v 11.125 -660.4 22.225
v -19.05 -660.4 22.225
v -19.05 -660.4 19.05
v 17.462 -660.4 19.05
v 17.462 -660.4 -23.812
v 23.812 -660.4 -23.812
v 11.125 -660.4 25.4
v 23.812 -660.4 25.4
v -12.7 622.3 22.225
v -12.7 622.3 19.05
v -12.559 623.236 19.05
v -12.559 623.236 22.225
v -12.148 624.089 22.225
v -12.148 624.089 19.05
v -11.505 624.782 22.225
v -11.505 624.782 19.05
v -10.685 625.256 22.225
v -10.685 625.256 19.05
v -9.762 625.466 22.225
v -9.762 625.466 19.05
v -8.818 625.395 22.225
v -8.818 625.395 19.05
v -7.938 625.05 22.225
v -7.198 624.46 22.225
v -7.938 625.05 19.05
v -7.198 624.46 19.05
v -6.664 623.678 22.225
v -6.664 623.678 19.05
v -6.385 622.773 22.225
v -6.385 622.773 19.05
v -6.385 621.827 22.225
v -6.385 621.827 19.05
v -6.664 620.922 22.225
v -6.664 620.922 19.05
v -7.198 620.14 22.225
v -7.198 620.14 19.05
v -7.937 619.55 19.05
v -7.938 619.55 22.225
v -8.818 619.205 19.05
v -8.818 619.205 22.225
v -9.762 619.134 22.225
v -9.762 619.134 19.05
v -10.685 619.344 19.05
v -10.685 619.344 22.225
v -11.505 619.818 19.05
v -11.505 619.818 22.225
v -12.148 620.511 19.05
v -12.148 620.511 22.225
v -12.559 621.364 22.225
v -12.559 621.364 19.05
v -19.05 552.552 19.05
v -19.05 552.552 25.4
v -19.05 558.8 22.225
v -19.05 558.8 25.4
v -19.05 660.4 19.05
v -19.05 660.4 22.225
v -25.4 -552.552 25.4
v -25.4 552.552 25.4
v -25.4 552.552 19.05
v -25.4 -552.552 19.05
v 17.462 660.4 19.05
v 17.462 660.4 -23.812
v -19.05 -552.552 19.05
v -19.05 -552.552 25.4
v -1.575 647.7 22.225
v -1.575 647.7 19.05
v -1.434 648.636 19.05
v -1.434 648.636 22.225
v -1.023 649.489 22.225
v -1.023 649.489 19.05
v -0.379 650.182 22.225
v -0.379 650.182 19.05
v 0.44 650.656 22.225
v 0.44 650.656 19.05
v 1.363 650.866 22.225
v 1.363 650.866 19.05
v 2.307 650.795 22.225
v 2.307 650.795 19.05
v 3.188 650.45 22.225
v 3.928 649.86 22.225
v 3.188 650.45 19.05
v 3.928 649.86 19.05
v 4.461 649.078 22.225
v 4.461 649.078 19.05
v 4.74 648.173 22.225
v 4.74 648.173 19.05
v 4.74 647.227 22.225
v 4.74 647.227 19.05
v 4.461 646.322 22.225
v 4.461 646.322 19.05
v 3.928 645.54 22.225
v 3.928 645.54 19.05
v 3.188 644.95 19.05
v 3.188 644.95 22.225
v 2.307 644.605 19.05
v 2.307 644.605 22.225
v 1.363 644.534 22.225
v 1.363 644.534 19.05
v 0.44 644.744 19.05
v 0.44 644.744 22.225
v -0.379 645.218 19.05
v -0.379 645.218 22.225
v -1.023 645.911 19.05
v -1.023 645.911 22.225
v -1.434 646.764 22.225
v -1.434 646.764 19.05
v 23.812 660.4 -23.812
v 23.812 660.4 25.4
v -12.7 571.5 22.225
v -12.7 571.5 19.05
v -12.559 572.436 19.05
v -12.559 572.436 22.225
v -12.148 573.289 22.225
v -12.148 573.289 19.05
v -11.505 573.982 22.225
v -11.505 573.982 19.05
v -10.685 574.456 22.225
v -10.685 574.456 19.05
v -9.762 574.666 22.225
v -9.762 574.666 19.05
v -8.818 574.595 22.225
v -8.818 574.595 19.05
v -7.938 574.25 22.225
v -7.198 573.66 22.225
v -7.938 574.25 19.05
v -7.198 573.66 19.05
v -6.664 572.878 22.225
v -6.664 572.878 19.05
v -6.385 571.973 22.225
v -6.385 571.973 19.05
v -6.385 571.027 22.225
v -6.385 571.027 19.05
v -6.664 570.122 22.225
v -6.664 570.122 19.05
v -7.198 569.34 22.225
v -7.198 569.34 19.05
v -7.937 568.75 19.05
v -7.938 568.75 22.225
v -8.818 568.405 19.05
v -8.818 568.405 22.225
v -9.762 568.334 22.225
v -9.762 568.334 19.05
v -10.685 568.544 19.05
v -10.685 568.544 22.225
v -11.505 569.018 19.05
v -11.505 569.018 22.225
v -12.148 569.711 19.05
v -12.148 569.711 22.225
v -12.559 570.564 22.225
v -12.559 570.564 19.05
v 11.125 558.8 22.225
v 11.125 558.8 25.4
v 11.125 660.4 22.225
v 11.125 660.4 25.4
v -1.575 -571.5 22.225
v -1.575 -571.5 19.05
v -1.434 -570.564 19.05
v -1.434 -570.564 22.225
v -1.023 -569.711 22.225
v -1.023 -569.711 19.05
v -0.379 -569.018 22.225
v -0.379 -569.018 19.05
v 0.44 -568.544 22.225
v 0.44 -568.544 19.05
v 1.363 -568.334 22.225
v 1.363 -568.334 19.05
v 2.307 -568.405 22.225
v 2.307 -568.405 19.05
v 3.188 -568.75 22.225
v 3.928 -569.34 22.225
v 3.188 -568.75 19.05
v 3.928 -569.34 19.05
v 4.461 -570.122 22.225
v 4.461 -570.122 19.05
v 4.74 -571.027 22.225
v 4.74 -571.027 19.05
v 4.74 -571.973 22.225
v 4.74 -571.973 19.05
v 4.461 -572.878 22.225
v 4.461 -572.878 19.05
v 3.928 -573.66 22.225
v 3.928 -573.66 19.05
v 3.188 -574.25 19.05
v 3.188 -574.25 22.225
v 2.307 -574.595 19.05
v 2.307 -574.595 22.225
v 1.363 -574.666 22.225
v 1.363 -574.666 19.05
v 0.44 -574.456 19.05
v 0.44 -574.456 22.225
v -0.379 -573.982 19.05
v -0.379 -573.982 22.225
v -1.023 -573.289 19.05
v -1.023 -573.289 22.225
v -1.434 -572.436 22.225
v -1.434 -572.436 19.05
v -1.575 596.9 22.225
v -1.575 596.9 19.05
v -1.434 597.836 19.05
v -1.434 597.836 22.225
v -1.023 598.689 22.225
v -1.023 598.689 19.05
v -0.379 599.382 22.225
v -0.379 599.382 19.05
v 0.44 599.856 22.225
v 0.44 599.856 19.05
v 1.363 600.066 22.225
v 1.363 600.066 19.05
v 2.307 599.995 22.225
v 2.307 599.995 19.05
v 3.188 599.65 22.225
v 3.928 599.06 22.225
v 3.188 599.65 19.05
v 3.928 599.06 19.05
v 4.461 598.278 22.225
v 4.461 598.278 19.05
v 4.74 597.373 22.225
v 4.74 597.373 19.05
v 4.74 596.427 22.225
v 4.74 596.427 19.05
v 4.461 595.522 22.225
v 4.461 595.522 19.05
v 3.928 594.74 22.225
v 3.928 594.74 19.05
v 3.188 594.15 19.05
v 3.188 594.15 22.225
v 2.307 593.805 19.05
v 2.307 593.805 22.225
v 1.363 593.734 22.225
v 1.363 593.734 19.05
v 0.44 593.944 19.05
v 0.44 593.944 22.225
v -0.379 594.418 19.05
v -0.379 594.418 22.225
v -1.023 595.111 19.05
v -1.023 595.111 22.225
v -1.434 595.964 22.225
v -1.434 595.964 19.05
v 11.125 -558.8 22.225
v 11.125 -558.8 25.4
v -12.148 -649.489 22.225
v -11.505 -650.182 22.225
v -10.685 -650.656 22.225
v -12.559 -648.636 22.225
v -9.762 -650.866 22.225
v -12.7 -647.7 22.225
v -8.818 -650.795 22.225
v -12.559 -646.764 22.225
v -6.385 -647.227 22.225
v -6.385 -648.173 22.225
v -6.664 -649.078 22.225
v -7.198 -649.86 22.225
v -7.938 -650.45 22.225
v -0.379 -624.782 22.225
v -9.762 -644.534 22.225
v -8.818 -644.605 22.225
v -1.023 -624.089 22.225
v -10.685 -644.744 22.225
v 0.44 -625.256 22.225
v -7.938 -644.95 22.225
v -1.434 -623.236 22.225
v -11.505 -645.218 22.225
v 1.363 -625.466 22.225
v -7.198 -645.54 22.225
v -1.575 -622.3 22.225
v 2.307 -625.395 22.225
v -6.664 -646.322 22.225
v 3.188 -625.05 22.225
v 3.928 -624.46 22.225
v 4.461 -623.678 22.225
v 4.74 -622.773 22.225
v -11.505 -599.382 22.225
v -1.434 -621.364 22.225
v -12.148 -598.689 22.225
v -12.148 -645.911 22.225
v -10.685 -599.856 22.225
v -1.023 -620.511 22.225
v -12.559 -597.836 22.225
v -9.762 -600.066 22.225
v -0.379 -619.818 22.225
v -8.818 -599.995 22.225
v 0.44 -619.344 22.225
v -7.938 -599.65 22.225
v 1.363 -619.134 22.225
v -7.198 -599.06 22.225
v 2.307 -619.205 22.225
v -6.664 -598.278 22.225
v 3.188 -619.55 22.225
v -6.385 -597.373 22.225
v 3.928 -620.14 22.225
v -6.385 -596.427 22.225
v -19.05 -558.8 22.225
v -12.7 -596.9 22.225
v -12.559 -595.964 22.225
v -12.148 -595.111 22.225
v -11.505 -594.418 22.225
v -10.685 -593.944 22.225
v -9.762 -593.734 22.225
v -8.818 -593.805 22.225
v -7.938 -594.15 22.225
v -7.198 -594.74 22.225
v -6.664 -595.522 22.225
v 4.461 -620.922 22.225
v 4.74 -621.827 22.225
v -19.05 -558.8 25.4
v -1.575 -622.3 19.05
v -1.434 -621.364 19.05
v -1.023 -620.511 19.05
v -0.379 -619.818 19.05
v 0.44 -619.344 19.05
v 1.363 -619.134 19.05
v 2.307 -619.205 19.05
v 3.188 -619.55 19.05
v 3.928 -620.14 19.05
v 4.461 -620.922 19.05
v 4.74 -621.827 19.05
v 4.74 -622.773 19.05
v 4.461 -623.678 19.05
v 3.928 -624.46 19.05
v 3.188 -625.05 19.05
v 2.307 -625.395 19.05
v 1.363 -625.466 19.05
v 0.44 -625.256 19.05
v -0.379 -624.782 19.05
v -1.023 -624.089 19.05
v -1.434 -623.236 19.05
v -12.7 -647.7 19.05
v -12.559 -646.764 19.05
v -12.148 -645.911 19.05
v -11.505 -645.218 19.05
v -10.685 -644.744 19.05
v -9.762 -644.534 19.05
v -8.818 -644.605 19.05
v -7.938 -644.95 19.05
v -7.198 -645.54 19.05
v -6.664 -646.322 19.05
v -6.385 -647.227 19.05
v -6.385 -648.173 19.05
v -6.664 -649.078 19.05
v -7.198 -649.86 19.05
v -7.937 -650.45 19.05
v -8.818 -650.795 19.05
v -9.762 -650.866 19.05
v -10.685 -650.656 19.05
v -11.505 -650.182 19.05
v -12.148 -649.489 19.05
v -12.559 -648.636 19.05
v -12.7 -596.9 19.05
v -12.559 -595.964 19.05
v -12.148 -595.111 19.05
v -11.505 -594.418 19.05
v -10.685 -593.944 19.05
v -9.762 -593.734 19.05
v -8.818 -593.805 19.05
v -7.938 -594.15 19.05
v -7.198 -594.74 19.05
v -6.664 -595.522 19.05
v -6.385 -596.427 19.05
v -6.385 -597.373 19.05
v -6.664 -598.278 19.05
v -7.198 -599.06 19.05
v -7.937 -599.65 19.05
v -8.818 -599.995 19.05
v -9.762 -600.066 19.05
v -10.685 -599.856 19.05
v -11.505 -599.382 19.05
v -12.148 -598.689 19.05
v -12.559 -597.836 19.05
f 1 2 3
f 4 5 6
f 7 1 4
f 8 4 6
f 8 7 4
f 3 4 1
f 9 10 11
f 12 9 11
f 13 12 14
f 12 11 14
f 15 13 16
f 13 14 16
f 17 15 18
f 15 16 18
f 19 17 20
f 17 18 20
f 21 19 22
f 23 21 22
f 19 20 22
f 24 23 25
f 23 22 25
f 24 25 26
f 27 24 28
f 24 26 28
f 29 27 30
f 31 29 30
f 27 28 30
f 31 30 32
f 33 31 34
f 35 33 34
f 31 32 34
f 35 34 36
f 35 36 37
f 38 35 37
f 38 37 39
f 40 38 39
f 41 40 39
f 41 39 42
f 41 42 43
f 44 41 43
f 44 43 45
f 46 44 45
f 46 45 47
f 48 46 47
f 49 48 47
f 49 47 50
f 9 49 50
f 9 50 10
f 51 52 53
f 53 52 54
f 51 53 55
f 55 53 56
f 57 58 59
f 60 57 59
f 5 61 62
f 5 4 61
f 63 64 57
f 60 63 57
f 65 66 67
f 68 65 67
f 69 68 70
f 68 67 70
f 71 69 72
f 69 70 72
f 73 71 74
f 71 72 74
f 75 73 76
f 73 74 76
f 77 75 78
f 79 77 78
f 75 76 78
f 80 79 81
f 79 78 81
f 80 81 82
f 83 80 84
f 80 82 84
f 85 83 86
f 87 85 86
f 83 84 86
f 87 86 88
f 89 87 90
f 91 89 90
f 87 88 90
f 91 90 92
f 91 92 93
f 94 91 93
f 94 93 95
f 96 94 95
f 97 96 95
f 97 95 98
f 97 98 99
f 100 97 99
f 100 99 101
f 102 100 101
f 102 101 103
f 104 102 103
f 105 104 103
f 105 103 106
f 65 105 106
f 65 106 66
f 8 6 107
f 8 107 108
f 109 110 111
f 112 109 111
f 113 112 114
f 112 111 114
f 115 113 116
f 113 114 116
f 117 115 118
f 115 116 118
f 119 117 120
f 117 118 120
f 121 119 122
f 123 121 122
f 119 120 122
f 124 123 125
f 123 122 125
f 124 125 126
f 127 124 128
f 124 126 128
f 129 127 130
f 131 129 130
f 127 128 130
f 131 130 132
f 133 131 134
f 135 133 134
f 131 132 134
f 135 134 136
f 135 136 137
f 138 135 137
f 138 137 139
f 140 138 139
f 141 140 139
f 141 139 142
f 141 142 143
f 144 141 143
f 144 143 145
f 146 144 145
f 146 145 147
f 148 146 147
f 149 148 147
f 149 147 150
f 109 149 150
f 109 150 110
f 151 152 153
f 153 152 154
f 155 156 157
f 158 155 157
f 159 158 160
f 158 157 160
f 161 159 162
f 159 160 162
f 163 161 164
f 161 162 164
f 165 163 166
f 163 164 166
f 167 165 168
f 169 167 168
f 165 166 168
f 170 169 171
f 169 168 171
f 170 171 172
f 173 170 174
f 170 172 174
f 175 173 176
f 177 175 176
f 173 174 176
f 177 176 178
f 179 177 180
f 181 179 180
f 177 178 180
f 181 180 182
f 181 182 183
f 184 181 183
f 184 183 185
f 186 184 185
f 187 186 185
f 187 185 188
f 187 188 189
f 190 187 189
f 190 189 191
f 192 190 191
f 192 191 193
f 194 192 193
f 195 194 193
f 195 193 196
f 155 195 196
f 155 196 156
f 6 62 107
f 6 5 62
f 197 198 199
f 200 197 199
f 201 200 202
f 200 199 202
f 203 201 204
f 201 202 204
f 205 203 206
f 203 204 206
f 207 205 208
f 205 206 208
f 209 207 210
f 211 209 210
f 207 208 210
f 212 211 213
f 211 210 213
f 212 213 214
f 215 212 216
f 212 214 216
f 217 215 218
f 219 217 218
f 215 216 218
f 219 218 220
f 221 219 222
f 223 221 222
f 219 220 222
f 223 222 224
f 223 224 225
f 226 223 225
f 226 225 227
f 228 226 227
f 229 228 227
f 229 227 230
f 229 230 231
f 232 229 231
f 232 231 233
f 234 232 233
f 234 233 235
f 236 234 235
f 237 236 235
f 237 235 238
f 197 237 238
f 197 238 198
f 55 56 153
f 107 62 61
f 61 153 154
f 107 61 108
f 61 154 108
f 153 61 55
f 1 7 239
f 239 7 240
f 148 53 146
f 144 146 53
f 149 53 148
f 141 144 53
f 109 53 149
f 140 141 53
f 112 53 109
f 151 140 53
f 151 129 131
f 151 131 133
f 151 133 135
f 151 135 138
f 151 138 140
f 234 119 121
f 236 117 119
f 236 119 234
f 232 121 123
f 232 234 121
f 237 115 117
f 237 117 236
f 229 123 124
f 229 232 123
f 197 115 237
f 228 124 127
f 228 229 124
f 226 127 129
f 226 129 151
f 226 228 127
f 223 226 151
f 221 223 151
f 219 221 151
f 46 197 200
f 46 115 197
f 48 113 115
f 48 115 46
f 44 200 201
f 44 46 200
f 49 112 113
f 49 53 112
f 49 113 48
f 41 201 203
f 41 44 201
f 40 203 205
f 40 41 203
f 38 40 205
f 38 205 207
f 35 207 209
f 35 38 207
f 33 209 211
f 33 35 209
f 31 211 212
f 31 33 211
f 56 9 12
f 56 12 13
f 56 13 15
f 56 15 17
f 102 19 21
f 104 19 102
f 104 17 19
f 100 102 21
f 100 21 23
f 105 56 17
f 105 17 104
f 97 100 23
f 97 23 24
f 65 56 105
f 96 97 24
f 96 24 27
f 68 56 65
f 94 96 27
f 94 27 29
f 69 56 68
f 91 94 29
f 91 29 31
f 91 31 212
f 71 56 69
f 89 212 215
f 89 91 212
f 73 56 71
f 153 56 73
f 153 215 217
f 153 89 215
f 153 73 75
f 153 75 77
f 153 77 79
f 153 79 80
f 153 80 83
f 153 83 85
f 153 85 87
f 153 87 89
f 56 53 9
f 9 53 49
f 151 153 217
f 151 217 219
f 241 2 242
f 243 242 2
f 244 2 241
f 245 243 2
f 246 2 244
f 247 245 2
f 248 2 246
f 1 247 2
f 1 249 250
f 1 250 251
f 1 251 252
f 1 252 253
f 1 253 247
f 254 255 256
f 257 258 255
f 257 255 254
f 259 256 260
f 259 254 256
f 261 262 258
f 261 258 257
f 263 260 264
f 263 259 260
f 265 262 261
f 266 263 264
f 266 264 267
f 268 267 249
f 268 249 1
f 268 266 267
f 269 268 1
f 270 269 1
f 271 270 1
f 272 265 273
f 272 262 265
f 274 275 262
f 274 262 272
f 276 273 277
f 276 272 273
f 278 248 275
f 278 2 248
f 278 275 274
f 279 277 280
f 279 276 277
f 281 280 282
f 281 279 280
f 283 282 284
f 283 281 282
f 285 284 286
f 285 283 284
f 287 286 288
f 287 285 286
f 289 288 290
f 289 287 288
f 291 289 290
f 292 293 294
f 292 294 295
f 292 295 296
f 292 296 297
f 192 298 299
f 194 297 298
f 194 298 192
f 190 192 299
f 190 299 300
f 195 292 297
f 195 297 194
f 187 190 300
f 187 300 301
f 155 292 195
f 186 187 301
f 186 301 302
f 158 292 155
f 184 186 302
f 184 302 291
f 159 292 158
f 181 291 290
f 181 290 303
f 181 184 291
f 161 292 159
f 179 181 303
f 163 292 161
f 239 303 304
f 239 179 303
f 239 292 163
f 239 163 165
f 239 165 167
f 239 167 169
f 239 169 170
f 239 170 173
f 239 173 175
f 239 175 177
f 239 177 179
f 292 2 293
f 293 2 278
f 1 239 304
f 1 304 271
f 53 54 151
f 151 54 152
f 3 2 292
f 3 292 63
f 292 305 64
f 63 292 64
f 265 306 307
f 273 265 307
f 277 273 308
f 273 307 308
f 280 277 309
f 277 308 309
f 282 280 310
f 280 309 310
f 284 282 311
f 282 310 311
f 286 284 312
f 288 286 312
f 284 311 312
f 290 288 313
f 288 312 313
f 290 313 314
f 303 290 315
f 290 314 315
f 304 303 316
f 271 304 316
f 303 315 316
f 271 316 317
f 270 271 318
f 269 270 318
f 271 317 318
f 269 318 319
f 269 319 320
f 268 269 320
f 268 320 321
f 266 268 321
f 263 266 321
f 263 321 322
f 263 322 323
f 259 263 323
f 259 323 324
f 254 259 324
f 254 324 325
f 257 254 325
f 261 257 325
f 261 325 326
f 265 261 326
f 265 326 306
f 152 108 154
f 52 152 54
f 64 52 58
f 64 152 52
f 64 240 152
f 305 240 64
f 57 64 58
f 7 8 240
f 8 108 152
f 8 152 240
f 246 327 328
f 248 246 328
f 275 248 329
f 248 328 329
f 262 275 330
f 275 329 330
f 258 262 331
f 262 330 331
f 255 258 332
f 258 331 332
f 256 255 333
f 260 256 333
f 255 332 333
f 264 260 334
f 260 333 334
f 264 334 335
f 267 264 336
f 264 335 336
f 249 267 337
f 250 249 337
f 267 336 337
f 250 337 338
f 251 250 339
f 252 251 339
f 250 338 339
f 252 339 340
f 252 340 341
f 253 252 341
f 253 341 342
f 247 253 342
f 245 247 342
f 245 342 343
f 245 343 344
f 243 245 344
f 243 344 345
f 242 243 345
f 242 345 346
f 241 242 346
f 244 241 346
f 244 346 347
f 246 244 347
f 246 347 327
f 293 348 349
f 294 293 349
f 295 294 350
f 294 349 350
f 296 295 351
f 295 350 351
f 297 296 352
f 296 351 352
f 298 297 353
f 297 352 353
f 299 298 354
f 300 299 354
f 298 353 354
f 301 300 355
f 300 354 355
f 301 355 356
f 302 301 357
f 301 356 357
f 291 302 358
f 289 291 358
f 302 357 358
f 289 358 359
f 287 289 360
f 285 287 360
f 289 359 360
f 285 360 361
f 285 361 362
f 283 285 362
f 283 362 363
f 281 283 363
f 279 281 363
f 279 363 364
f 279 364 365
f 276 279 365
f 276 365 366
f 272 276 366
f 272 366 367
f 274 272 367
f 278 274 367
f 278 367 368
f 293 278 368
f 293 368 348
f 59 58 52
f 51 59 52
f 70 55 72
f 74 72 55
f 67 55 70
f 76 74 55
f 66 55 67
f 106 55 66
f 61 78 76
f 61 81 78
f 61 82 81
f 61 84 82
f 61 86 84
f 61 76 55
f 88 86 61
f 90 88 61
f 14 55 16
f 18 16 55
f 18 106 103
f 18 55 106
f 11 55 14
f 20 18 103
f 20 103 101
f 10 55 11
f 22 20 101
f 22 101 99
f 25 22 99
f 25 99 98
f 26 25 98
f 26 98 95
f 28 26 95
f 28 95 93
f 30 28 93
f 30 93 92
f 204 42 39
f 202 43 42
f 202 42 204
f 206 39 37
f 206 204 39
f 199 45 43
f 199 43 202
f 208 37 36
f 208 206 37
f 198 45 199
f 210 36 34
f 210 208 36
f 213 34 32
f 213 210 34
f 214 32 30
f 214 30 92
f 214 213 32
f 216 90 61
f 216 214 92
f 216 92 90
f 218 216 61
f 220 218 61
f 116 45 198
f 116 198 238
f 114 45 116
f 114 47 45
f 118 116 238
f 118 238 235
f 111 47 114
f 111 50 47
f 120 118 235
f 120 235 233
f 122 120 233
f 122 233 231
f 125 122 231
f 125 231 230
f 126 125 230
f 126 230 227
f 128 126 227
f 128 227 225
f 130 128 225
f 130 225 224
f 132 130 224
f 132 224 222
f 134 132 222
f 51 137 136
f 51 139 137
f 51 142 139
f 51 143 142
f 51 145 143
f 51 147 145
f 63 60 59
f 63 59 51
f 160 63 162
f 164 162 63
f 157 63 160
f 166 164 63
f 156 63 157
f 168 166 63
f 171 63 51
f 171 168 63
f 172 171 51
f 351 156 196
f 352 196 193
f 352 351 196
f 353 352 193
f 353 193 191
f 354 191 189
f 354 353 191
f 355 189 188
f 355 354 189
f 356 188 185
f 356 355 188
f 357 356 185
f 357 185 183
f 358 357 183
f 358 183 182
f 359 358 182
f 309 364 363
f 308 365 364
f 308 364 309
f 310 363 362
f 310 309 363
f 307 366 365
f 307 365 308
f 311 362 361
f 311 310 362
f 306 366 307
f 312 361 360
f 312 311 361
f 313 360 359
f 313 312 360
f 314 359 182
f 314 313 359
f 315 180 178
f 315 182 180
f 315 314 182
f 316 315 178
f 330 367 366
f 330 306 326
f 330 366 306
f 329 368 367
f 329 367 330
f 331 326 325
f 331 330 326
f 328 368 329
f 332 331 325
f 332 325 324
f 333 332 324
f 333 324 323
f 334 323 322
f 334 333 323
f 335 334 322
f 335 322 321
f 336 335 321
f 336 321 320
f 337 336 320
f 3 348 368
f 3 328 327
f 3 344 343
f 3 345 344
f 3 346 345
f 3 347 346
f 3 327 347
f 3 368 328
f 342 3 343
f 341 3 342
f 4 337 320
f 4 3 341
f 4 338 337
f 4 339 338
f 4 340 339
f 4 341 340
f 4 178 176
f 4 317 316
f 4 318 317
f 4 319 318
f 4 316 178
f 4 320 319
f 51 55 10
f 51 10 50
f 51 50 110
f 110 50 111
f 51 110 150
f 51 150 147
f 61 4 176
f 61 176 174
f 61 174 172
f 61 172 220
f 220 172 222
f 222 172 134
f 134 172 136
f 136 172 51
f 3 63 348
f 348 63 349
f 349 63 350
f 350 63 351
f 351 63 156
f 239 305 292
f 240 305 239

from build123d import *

# Parameters (mm, degrees)
F1_DEPTH = 660.4
F2_W     = 30.1752
F2_H     = 101.6
F2_R     = 3.175
F3_DEPTH = 3.175
F4_D     = 6.35
F5_DEPTH = 49.2135


with BuildPart() as f1:
    # F0 (on Front) → F1 (new body, symmetric)
    with BuildSketch(Plane.XZ):
        Polygon((17.4625, -23.812496), (23.8125, -23.812496), (23.8125, 25.400004), (-25.4, 25.400004), (-25.4, 19.050004), (17.4625, 19.050004), align=None)
    extrude(amount=F1_DEPTH, both=True)

    # F2 (on face) → F3 (cut)
    with BuildSketch(Plane.XY.offset(25.400004)):
        with Locations((-3.9624, -609.6)):
            Rectangle(F2_W, F2_H)
        with Locations((-9.525, -647.7)):
            Circle(F2_R, mode=Mode.SUBTRACT)
        with Locations((-9.525, -596.9)):
            Circle(F2_R, mode=Mode.SUBTRACT)
        with Locations((1.6002, -622.3)):
            Circle(F2_R, mode=Mode.SUBTRACT)
        with Locations((1.6002, -571.5)):
            Circle(F2_R, mode=Mode.SUBTRACT)
        with Locations((-3.9624, 609.6)):
            Rectangle(F2_W, F2_H)
        with Locations((-9.525, 571.5)):
            Circle(F2_R, mode=Mode.SUBTRACT)
        with Locations((-9.525, 622.3)):
            Circle(F2_R, mode=Mode.SUBTRACT)
        with Locations((1.6002, 596.9)):
            Circle(F2_R, mode=Mode.SUBTRACT)
        with Locations((1.6002, 647.7)):
            Circle(F2_R, mode=Mode.SUBTRACT)
    extrude(amount=-F3_DEPTH, mode=Mode.SUBTRACT)

    # F4 (through all)
    with Locations(Plane.XY.offset(25.400004)):
        with Locations((1.6002, -571.5), (-9.525, -596.9), (1.6002, -622.3), (-9.525, -647.7), (1.6002, 647.7), (-9.525, 622.3), (1.6002, 596.9), (-9.525, 571.5)):
            Hole(F4_D / 2)

    # F2 (on face) → F5 (cut, through all)
    with BuildSketch(Plane.XY.offset(25.400004)):
        Polygon((-25.4, 660.4), (-25.4, 552.5516), (-19.05, 552.5516), (-19.05, 558.8), (-19.05, 660.4), align=None)
        Polygon((-19.05, -552.5516), (-25.4, -552.5516), (-25.4, -660.4), (-19.05, -660.4), (-19.05, -558.8), align=None)
    extrude(amount=-F5_DEPTH, mode=Mode.SUBTRACT)


solid = f1.part
